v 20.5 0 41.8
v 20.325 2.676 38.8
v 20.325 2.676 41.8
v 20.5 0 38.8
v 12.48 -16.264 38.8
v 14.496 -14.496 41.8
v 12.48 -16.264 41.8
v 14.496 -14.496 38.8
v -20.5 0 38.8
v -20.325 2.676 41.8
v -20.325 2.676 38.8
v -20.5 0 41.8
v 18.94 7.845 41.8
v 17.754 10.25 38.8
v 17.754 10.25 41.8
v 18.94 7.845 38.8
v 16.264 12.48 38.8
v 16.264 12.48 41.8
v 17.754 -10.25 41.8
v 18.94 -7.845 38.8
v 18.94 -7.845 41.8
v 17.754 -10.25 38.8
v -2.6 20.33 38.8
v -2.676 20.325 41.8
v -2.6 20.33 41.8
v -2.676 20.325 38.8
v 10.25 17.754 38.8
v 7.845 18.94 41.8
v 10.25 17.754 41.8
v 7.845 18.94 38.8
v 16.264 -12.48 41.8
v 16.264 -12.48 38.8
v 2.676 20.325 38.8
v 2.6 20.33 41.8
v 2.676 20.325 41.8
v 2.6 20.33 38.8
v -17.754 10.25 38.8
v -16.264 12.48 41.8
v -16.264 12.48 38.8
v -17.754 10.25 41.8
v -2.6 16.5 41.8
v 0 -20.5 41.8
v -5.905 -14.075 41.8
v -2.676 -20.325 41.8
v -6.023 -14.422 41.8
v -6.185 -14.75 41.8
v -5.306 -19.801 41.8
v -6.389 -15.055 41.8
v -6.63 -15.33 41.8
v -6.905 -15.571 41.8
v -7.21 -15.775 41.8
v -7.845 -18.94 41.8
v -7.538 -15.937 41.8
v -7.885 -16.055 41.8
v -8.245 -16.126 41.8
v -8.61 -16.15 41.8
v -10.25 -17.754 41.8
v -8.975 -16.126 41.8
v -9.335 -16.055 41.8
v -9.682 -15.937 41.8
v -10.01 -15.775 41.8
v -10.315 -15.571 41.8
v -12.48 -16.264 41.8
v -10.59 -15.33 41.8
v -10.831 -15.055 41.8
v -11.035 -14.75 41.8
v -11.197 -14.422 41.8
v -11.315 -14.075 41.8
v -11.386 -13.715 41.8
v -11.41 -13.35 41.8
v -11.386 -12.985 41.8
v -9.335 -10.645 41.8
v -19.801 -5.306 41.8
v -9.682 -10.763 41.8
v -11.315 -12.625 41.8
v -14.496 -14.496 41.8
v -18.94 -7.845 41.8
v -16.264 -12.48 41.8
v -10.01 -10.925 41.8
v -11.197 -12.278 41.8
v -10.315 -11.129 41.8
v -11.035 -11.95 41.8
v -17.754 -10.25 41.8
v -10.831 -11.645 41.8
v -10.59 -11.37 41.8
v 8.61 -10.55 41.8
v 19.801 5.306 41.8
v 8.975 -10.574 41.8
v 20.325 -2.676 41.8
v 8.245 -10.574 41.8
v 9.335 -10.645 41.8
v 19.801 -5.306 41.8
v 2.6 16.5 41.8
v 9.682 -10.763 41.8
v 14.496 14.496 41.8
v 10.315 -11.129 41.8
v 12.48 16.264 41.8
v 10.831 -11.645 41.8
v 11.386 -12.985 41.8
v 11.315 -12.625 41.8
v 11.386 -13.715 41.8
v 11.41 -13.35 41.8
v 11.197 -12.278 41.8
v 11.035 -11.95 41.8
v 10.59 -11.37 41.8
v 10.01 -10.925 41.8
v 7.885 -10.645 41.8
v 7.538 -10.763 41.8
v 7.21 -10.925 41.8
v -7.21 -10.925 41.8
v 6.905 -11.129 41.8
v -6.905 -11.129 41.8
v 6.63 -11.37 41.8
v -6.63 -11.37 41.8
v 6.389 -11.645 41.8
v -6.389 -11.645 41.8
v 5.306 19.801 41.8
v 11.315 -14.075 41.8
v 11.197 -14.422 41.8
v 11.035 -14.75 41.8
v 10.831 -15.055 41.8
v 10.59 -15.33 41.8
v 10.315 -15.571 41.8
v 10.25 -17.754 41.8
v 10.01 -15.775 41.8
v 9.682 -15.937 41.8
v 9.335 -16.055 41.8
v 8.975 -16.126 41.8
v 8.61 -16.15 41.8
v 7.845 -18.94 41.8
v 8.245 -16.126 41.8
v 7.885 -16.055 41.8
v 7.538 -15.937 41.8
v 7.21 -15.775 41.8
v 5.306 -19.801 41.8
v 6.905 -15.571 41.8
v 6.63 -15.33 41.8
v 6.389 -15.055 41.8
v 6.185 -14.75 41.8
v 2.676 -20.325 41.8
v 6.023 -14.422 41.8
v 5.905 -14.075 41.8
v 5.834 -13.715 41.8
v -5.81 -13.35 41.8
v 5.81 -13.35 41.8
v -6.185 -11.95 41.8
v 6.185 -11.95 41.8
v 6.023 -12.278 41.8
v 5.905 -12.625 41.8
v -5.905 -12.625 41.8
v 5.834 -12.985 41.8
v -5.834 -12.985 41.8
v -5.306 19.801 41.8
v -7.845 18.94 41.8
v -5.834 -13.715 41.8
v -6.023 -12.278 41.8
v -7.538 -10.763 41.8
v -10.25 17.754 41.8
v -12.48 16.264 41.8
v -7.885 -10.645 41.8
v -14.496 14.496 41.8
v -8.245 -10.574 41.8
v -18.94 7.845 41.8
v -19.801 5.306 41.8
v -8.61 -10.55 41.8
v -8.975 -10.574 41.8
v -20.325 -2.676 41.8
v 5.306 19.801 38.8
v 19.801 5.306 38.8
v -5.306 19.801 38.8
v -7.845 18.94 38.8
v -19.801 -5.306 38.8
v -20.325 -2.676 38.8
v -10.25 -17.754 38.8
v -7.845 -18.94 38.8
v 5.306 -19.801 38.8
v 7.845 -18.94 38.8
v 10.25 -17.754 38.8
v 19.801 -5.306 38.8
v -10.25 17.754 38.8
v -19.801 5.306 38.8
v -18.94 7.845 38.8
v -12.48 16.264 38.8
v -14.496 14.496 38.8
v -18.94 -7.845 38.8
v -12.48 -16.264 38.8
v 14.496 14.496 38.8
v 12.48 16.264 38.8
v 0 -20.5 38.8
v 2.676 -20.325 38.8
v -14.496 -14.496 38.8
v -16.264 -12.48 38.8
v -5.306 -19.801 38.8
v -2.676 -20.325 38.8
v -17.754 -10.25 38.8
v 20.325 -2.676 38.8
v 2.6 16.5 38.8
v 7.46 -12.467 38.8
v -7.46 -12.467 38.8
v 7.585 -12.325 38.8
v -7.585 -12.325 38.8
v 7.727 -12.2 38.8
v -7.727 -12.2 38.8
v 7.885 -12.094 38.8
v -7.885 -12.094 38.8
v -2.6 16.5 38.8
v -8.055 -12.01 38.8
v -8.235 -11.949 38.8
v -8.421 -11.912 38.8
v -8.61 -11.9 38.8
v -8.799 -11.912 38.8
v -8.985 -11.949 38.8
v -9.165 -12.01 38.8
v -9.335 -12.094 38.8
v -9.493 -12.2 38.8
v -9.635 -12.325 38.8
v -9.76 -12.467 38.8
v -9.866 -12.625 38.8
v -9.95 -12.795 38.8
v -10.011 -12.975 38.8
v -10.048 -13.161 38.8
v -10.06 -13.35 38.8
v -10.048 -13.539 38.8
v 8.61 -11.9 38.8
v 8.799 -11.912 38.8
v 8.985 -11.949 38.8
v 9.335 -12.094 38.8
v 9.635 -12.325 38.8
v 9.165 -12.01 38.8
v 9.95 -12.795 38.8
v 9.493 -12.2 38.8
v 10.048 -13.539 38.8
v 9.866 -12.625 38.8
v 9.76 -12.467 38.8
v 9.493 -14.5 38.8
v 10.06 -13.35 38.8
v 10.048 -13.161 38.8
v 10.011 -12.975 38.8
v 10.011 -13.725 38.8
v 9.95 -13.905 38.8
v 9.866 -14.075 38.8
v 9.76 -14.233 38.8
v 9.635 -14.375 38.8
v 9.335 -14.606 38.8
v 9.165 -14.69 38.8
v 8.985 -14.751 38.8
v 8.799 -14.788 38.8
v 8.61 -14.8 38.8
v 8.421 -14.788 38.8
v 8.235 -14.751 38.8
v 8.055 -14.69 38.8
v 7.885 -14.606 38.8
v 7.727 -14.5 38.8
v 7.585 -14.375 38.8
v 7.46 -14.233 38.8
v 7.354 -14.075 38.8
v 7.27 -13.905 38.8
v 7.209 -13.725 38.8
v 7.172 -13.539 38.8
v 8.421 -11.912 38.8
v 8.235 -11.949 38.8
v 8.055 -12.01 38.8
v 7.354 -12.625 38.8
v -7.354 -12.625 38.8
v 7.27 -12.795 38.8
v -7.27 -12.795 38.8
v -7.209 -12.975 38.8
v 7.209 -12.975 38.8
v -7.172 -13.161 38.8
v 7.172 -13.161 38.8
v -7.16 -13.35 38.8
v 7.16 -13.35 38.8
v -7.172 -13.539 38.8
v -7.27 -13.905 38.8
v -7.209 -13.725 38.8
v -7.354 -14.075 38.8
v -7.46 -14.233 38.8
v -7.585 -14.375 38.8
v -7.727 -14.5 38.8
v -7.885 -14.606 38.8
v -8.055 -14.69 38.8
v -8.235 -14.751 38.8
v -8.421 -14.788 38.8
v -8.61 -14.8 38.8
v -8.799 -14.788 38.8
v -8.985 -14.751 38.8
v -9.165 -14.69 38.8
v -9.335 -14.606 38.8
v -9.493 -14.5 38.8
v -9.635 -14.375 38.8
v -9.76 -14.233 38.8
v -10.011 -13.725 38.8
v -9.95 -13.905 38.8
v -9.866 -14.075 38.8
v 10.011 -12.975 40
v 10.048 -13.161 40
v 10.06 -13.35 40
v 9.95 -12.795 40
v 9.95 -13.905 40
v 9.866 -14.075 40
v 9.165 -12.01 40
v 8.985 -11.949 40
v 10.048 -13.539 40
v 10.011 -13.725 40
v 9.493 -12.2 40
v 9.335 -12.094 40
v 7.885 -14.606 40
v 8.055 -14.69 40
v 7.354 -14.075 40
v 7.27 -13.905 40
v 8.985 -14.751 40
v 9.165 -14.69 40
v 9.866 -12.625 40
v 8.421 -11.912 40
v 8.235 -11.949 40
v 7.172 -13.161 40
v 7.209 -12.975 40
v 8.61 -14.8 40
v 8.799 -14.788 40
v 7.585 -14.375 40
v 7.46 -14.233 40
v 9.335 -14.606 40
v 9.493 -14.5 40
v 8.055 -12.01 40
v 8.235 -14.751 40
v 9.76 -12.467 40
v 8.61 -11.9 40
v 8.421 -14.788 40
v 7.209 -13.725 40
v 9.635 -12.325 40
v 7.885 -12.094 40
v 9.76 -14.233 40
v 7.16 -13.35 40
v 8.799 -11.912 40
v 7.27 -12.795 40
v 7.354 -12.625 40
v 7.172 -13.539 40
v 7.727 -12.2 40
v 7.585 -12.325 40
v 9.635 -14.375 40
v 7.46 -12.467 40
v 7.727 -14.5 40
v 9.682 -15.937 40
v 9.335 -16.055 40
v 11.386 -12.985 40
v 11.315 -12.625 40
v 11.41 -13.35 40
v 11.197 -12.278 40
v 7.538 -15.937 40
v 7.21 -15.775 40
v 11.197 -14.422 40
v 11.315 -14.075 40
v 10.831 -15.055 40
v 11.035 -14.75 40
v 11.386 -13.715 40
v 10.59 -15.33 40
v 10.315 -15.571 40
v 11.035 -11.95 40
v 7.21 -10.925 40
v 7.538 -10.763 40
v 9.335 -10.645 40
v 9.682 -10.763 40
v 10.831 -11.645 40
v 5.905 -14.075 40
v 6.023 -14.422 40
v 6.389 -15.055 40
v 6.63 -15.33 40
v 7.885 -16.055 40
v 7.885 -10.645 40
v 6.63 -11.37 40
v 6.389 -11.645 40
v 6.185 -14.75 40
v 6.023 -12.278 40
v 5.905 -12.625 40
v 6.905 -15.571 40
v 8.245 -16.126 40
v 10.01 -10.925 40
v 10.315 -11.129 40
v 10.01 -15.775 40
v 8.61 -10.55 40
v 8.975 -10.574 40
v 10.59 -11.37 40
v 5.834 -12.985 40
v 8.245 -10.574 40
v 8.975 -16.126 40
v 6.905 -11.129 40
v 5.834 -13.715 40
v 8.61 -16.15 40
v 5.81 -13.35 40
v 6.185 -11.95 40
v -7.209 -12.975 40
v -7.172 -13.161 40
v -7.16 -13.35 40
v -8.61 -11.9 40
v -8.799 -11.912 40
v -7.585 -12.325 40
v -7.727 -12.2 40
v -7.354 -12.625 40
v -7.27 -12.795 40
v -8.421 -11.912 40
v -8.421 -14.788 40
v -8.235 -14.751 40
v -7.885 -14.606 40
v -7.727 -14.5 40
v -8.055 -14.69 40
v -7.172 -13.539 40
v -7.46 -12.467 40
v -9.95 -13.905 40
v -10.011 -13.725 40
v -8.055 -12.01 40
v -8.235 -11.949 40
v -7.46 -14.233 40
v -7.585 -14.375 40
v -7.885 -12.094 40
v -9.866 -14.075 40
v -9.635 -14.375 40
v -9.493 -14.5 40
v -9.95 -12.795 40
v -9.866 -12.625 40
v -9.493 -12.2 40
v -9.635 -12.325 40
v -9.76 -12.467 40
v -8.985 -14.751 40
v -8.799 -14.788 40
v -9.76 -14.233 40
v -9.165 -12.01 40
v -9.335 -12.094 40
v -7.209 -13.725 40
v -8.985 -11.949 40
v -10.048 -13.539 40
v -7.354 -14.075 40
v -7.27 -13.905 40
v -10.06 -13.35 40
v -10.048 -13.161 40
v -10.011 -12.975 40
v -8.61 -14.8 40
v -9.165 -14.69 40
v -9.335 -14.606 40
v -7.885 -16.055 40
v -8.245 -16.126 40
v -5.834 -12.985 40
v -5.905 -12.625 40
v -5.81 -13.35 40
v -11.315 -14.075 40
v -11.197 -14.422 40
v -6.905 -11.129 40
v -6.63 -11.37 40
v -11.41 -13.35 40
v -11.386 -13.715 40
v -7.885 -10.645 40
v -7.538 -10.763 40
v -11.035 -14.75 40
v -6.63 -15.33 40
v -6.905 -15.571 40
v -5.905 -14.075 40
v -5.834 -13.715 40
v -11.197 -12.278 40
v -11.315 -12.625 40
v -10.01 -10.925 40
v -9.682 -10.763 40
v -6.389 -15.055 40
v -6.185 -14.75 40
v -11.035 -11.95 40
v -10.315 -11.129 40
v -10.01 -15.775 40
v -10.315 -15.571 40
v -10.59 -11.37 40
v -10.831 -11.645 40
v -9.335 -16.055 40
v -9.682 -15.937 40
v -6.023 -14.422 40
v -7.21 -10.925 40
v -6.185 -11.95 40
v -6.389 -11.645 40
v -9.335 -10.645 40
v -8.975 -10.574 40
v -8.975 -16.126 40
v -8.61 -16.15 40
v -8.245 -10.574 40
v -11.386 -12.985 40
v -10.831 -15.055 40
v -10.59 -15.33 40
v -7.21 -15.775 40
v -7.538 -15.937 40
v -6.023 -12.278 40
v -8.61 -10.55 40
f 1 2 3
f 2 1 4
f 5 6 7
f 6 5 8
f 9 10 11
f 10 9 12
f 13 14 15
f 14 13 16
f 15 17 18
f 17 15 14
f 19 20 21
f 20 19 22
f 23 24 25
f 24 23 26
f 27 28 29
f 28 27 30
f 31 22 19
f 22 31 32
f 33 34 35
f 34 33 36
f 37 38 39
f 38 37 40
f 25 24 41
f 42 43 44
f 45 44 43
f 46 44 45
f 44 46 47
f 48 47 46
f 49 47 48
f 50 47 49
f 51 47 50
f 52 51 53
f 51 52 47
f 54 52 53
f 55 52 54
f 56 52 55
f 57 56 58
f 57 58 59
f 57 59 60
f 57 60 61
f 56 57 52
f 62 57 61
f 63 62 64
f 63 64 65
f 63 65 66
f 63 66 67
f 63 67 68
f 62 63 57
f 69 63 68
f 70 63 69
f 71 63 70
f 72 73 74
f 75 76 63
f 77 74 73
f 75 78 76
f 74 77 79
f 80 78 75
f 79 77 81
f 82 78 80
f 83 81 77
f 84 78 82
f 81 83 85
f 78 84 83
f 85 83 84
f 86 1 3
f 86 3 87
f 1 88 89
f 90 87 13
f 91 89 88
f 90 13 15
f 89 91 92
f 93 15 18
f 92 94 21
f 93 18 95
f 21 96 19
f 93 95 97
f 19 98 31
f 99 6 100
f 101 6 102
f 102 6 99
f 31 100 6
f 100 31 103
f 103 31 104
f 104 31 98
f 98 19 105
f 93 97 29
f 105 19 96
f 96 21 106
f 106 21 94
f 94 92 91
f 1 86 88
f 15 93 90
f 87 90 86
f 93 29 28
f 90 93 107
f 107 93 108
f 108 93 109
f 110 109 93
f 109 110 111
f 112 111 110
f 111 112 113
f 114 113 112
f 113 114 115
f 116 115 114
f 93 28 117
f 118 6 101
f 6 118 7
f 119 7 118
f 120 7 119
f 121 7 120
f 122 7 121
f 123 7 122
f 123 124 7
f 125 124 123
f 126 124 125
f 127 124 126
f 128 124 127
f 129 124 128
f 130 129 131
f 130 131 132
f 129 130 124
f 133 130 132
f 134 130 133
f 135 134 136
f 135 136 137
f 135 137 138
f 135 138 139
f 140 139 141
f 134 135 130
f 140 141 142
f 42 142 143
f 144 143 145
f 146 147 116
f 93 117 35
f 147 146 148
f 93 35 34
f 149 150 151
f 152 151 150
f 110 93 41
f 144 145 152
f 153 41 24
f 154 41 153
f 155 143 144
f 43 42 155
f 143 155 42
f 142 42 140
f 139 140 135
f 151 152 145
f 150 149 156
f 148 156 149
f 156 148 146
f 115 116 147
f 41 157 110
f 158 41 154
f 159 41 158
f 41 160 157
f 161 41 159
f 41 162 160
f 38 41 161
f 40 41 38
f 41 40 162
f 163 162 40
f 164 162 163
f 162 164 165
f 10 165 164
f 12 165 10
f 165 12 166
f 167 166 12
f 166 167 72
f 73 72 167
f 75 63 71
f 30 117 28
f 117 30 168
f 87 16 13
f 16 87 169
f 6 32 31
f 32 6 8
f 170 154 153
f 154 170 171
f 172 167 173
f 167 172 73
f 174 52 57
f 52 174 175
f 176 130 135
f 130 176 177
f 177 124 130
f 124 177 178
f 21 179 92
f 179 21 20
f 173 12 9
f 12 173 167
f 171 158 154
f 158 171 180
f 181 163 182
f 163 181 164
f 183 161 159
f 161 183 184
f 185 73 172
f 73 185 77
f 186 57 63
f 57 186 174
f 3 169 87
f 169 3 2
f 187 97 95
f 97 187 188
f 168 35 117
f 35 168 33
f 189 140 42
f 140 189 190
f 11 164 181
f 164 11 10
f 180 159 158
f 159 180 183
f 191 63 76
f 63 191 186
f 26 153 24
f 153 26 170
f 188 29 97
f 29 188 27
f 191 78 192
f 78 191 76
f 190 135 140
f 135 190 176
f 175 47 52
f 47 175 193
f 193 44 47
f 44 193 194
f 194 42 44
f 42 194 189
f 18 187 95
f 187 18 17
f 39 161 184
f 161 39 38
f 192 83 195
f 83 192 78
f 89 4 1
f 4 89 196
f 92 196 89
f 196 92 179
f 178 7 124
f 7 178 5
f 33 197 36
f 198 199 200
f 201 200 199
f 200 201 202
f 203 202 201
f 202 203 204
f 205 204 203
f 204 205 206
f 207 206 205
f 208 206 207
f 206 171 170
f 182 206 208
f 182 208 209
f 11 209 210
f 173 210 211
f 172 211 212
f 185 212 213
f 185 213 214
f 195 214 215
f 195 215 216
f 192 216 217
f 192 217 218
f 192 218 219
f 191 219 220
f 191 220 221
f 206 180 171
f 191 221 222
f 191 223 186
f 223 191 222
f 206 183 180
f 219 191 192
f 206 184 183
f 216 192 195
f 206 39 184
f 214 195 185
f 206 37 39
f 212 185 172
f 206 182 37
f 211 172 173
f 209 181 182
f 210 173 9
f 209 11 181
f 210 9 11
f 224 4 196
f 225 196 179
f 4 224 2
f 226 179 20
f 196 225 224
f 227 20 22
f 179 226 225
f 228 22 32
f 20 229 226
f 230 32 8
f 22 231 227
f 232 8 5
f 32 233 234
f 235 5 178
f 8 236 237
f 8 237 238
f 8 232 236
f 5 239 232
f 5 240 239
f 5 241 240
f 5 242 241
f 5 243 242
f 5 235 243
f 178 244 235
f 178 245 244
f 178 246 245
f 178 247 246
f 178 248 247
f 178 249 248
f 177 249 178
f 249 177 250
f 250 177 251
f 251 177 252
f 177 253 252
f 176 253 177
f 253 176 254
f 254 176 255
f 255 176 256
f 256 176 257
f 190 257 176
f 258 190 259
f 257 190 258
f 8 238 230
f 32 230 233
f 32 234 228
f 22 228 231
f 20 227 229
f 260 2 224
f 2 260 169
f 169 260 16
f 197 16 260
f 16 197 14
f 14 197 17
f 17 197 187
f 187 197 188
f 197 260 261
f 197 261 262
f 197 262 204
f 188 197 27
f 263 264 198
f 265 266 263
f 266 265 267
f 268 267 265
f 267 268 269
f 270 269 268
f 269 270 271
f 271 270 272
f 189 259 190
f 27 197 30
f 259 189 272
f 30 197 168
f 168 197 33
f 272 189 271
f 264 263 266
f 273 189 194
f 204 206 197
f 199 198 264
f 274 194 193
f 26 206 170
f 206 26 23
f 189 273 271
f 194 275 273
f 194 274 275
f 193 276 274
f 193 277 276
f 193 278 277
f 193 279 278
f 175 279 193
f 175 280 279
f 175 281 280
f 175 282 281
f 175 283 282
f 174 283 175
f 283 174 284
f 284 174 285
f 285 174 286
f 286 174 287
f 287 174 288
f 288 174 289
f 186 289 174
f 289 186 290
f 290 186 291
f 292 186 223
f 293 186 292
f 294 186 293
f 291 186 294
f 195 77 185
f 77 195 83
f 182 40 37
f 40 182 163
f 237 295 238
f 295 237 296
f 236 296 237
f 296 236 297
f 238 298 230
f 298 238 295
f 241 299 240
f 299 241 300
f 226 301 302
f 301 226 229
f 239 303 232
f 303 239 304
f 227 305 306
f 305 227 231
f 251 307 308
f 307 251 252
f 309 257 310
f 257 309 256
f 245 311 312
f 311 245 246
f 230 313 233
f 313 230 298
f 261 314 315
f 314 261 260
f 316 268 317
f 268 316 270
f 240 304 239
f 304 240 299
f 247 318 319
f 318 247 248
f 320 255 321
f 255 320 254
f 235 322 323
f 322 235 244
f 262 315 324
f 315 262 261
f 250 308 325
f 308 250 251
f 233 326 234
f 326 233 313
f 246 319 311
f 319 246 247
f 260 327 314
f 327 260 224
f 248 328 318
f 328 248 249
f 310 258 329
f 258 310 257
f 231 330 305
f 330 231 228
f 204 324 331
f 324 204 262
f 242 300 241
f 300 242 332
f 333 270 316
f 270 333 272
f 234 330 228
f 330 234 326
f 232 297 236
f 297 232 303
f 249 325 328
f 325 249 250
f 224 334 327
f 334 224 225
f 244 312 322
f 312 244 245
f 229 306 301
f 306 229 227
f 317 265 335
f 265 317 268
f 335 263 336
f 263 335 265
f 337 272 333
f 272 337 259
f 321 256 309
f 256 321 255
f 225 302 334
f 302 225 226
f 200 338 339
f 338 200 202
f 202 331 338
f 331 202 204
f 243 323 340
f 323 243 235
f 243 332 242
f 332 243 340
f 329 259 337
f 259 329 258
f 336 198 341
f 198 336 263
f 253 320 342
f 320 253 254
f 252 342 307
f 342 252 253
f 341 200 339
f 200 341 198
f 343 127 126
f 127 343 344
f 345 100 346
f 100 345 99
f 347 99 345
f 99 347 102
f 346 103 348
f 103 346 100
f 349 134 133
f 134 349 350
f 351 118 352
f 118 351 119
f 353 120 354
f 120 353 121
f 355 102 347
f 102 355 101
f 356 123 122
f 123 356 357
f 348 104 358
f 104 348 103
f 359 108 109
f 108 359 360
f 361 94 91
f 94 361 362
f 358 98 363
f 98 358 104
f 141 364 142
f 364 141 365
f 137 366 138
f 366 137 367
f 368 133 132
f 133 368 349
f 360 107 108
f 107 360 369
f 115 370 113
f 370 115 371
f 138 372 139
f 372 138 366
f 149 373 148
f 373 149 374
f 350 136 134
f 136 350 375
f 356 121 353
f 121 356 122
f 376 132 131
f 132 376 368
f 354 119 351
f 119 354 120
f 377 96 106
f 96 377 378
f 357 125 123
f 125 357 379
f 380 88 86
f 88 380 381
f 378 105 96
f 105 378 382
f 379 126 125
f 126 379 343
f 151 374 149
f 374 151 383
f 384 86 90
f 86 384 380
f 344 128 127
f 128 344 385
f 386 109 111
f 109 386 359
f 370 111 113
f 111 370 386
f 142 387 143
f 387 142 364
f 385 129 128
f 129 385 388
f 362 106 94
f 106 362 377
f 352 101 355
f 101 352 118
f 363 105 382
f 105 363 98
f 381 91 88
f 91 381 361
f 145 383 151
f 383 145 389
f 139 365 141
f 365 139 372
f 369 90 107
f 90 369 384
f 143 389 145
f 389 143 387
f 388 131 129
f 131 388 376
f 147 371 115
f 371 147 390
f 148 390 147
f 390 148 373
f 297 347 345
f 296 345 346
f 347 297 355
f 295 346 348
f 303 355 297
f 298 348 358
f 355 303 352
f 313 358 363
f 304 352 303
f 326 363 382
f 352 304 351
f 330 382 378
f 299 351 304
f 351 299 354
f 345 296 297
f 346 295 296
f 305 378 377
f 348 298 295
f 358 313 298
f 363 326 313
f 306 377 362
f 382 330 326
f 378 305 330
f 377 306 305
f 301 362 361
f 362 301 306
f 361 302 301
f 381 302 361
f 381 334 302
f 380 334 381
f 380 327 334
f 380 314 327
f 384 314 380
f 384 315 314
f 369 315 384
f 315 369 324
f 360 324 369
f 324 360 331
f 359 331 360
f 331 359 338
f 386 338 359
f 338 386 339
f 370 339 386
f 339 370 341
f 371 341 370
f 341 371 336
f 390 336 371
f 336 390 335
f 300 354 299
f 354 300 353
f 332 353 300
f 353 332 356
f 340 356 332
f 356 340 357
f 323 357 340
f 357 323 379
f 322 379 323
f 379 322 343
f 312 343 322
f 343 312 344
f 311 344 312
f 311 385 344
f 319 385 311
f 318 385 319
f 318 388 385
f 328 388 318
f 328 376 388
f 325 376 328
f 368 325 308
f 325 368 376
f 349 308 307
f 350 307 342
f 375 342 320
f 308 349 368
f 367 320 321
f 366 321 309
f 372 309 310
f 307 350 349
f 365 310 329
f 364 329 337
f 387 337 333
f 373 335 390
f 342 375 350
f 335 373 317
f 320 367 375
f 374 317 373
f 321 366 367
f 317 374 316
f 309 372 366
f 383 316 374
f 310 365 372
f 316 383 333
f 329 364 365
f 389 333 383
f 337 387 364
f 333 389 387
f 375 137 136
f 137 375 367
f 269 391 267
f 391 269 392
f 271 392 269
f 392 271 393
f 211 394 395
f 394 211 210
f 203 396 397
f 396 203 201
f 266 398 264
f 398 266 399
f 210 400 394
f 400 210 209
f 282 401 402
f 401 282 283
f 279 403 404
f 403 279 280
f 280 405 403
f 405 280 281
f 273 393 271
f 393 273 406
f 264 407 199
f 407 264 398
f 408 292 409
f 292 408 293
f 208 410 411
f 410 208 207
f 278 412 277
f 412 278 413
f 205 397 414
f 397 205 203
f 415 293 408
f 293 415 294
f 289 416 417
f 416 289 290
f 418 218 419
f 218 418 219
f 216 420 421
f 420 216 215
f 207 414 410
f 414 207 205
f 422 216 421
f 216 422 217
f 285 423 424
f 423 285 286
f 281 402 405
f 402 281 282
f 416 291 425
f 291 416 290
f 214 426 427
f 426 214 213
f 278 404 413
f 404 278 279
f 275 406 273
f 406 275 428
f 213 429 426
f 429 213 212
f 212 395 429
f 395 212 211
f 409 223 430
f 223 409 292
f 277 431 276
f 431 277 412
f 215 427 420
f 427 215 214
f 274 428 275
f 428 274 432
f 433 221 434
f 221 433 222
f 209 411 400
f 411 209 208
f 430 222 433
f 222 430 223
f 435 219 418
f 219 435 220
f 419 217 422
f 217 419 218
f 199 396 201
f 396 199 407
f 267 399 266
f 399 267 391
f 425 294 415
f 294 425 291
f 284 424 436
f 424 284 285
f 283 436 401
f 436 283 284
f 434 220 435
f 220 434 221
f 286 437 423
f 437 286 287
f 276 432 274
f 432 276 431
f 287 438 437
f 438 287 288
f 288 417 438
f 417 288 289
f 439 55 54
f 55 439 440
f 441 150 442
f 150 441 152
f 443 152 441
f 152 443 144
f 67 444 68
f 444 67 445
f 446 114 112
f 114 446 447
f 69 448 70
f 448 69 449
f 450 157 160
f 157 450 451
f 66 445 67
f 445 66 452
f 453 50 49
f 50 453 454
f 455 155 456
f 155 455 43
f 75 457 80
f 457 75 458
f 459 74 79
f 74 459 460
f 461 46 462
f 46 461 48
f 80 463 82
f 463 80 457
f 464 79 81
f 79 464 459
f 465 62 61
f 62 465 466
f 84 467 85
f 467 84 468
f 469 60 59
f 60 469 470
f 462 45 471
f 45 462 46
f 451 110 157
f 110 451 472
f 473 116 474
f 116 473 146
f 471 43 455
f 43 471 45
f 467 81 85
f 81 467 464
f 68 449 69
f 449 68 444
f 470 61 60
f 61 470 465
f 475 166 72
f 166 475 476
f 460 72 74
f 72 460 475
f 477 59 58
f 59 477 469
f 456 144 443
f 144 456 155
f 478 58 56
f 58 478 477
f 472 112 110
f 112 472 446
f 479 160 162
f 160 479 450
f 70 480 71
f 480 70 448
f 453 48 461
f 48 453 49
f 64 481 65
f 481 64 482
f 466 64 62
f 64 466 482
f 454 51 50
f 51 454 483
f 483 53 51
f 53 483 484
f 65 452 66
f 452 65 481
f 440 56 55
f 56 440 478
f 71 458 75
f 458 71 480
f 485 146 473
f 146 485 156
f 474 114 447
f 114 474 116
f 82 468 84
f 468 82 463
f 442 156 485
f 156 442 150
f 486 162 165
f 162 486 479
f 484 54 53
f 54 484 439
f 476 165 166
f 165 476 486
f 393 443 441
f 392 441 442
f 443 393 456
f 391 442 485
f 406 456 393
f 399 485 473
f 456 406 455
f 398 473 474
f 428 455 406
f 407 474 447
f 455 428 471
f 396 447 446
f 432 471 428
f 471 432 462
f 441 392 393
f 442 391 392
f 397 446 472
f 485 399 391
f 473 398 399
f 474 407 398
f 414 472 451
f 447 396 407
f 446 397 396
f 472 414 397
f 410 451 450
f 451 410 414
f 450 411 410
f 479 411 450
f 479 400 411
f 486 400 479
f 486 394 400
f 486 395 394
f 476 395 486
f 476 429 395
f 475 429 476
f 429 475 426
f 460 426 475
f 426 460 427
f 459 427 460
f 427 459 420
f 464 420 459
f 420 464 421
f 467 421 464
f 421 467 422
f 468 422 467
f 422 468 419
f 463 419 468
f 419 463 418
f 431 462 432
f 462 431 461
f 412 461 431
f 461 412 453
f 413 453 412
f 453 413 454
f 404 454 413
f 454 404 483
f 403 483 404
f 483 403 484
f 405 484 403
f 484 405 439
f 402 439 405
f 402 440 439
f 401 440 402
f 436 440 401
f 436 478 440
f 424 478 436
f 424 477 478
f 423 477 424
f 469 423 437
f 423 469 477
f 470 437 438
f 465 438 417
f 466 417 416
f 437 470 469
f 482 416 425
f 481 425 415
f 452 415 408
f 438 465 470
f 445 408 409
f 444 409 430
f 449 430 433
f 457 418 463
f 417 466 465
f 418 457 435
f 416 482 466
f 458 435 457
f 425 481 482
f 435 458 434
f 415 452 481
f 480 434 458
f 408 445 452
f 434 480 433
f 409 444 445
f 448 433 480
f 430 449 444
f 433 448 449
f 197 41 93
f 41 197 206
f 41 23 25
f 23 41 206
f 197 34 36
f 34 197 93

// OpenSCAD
// left cartridge_cap_wroll: press F6 (render) then File > Export > STL
include <../lib/g1_servo_arm.scad>
side = "left";
part = "cartridge_cap_wroll";
